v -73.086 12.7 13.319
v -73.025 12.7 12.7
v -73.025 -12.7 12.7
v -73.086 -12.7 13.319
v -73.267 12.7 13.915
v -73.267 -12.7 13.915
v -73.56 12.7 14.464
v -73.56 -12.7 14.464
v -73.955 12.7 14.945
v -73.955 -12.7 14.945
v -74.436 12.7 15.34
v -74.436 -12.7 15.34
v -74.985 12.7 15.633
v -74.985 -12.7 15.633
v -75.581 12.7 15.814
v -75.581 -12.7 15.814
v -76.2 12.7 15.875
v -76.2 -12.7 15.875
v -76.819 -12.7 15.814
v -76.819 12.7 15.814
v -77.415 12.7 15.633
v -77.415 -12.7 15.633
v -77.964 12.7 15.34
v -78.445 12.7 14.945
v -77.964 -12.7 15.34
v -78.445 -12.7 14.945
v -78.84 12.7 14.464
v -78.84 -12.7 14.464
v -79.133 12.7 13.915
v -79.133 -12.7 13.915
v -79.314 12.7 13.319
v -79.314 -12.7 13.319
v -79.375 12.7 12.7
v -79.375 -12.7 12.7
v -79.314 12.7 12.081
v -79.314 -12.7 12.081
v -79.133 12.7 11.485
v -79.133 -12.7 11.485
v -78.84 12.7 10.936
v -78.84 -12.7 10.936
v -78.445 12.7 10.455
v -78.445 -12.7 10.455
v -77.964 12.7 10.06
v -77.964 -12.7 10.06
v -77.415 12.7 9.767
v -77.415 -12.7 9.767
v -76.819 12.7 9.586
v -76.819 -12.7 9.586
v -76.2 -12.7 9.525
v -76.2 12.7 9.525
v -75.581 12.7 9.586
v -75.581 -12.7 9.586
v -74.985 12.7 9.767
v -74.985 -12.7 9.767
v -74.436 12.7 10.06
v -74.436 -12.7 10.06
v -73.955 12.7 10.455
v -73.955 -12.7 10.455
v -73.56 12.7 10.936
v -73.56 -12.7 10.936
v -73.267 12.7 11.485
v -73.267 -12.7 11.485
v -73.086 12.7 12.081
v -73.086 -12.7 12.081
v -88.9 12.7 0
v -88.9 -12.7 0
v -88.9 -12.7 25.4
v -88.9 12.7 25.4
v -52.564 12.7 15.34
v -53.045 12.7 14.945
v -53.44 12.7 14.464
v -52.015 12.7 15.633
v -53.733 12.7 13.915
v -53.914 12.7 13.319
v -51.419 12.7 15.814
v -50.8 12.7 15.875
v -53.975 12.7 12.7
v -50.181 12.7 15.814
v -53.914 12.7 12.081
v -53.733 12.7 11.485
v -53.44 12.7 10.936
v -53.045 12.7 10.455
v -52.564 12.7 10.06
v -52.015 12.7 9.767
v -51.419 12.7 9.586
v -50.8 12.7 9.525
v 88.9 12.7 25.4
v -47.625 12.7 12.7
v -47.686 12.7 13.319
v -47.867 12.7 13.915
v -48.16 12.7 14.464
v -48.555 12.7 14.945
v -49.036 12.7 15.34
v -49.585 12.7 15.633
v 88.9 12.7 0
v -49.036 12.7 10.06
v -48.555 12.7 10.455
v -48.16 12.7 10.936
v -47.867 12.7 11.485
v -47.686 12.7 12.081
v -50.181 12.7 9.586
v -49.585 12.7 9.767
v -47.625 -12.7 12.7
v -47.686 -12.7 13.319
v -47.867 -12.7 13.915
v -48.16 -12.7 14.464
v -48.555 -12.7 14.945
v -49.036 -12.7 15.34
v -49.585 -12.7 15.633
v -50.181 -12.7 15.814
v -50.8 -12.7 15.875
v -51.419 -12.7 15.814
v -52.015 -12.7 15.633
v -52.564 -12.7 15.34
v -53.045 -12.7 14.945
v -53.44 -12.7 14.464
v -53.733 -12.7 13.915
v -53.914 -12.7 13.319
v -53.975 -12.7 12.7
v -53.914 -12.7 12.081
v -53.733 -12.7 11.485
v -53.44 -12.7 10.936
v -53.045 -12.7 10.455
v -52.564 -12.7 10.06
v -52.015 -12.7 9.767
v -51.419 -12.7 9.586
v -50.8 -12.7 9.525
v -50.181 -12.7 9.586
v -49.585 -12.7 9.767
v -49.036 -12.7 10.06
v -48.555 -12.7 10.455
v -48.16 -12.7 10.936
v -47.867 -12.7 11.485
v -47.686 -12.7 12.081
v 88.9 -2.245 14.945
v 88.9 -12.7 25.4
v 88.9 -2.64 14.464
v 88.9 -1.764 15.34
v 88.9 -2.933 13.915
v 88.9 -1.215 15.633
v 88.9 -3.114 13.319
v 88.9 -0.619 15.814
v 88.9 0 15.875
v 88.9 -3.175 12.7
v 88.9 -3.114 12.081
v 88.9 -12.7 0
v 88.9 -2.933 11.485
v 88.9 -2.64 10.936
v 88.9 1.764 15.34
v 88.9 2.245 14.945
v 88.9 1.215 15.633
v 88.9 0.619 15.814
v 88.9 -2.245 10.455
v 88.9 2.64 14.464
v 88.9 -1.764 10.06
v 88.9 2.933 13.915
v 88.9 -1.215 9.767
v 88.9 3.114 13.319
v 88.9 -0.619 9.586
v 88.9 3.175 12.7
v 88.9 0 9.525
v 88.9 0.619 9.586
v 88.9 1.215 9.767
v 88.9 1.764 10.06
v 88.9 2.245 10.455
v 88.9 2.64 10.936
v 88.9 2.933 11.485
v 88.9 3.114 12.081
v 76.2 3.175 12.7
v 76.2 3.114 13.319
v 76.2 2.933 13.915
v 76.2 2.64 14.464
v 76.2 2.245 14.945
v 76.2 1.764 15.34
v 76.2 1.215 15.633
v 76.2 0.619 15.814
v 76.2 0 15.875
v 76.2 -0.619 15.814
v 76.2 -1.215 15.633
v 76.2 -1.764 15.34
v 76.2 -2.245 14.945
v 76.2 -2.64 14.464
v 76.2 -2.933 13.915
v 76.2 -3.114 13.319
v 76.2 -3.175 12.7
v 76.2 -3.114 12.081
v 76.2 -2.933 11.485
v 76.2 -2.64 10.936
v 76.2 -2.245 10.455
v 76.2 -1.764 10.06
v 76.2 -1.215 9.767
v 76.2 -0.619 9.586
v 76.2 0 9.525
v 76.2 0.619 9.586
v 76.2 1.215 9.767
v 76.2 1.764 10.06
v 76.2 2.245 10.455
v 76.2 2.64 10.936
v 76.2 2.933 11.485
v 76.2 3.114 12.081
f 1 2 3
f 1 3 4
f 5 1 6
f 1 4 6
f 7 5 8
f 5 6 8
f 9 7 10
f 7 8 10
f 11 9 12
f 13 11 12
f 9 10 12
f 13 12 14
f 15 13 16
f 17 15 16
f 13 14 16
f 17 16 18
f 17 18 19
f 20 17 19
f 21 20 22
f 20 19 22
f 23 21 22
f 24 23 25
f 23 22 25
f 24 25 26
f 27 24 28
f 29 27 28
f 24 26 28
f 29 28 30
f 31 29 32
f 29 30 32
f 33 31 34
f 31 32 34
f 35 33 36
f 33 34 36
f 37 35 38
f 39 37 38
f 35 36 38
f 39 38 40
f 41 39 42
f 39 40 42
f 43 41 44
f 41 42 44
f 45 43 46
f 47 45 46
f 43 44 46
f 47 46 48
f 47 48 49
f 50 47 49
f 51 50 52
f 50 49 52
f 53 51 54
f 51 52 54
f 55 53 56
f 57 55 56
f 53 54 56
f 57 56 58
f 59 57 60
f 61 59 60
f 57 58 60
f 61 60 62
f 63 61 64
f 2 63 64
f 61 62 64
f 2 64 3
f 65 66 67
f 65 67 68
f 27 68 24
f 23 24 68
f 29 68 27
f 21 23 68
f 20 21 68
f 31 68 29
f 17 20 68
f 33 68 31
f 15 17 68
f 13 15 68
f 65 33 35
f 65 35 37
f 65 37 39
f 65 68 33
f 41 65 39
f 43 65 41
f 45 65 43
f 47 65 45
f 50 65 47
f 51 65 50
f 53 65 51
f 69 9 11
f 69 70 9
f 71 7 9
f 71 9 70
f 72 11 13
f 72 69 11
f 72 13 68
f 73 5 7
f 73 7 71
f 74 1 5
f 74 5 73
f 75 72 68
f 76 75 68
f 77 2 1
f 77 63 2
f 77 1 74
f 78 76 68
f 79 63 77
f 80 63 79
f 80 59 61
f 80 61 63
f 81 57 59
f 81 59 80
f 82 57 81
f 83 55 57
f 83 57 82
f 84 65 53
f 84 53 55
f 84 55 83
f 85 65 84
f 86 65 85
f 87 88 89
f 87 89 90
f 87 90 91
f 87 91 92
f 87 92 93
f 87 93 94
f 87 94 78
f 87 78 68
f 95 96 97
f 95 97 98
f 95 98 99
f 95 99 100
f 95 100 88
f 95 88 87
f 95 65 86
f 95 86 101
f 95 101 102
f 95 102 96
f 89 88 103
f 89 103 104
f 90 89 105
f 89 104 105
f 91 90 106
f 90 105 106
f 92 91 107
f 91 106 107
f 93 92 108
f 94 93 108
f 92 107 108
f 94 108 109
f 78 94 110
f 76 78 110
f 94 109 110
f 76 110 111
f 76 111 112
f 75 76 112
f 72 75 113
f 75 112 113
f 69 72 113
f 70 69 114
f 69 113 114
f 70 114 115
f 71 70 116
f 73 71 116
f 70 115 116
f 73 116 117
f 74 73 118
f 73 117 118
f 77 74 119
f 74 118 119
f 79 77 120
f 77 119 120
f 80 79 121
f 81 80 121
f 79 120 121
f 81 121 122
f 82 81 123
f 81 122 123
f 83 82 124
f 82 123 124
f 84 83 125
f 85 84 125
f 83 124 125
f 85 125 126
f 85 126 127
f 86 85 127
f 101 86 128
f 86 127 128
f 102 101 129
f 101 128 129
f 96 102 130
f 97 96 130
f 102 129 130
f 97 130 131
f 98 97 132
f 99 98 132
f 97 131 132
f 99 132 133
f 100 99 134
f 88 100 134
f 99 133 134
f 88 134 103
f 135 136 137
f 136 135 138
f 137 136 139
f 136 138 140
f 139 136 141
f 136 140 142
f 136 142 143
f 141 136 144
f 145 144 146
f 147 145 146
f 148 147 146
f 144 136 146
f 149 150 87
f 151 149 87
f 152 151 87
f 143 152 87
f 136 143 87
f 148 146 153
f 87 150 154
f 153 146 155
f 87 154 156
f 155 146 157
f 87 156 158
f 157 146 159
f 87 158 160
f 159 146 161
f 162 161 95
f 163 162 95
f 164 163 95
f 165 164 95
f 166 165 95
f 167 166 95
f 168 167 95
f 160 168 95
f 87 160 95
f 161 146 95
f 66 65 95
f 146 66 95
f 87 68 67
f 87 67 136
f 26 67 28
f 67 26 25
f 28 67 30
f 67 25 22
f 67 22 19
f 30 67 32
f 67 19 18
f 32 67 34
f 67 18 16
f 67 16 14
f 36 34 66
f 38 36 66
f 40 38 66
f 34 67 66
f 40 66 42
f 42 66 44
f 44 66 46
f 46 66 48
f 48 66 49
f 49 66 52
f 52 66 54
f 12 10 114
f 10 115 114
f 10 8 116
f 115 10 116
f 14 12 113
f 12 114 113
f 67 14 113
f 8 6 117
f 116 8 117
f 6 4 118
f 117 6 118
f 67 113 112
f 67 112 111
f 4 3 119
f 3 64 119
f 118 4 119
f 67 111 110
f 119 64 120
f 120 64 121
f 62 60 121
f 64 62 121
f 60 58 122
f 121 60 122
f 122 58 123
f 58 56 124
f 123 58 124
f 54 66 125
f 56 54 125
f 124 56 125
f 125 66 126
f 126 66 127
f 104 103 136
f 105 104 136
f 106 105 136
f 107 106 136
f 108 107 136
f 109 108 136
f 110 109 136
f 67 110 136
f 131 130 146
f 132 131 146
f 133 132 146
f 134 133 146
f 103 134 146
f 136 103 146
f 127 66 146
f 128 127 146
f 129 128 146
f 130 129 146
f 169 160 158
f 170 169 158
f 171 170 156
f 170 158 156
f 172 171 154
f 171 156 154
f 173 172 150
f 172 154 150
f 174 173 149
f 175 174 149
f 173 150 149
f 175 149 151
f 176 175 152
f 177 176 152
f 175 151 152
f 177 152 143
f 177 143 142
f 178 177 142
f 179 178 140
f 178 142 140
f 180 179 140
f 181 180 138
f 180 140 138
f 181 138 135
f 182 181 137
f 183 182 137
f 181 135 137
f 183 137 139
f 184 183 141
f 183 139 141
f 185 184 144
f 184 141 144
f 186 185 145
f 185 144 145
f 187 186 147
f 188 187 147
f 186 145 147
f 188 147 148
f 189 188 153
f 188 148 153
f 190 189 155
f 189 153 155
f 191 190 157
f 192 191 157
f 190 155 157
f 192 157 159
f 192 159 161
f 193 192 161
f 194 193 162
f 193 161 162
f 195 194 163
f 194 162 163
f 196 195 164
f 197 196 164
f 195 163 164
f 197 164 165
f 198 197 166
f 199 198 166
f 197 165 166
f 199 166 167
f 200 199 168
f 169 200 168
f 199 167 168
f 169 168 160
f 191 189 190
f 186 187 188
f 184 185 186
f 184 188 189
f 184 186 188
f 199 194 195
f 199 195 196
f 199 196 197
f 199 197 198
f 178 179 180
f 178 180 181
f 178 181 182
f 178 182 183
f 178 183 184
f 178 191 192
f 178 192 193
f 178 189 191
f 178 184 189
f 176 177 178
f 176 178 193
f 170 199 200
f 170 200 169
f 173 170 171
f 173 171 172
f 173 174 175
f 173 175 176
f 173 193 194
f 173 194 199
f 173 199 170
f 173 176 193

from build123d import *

# Parameters (mm, degrees)
F0_W     = 177.8
F0_H     = 25.4
F1_DEPTH = 25.4
F2_R     = 3.175
F3_DEPTH = 25.4
F4_R     = 3.175
F5_DEPTH = 12.7


with BuildPart() as f1:
    # F0 (on Top) → F1 (new body)
    with BuildSketch(Plane.XY):
        Rectangle(F0_W, F0_H)
    extrude(amount=F1_DEPTH)

    # F2 (on face) → F3 (cut)
    with BuildSketch(Plane.XZ.offset(12.7)):
        with Locations((-76.2, 12.7)):
            Circle(F2_R)
        with Locations((-50.8, 12.7)):
            Circle(F2_R)
    extrude(amount=-F3_DEPTH, mode=Mode.SUBTRACT)

    # F4 (on face) → F5 (cut)
    with BuildSketch(Plane.YZ.offset(88.9)):
        with Locations((0, 12.7)):
            Circle(F4_R)
    extrude(amount=-F5_DEPTH, mode=Mode.SUBTRACT)


solid = f1.part
